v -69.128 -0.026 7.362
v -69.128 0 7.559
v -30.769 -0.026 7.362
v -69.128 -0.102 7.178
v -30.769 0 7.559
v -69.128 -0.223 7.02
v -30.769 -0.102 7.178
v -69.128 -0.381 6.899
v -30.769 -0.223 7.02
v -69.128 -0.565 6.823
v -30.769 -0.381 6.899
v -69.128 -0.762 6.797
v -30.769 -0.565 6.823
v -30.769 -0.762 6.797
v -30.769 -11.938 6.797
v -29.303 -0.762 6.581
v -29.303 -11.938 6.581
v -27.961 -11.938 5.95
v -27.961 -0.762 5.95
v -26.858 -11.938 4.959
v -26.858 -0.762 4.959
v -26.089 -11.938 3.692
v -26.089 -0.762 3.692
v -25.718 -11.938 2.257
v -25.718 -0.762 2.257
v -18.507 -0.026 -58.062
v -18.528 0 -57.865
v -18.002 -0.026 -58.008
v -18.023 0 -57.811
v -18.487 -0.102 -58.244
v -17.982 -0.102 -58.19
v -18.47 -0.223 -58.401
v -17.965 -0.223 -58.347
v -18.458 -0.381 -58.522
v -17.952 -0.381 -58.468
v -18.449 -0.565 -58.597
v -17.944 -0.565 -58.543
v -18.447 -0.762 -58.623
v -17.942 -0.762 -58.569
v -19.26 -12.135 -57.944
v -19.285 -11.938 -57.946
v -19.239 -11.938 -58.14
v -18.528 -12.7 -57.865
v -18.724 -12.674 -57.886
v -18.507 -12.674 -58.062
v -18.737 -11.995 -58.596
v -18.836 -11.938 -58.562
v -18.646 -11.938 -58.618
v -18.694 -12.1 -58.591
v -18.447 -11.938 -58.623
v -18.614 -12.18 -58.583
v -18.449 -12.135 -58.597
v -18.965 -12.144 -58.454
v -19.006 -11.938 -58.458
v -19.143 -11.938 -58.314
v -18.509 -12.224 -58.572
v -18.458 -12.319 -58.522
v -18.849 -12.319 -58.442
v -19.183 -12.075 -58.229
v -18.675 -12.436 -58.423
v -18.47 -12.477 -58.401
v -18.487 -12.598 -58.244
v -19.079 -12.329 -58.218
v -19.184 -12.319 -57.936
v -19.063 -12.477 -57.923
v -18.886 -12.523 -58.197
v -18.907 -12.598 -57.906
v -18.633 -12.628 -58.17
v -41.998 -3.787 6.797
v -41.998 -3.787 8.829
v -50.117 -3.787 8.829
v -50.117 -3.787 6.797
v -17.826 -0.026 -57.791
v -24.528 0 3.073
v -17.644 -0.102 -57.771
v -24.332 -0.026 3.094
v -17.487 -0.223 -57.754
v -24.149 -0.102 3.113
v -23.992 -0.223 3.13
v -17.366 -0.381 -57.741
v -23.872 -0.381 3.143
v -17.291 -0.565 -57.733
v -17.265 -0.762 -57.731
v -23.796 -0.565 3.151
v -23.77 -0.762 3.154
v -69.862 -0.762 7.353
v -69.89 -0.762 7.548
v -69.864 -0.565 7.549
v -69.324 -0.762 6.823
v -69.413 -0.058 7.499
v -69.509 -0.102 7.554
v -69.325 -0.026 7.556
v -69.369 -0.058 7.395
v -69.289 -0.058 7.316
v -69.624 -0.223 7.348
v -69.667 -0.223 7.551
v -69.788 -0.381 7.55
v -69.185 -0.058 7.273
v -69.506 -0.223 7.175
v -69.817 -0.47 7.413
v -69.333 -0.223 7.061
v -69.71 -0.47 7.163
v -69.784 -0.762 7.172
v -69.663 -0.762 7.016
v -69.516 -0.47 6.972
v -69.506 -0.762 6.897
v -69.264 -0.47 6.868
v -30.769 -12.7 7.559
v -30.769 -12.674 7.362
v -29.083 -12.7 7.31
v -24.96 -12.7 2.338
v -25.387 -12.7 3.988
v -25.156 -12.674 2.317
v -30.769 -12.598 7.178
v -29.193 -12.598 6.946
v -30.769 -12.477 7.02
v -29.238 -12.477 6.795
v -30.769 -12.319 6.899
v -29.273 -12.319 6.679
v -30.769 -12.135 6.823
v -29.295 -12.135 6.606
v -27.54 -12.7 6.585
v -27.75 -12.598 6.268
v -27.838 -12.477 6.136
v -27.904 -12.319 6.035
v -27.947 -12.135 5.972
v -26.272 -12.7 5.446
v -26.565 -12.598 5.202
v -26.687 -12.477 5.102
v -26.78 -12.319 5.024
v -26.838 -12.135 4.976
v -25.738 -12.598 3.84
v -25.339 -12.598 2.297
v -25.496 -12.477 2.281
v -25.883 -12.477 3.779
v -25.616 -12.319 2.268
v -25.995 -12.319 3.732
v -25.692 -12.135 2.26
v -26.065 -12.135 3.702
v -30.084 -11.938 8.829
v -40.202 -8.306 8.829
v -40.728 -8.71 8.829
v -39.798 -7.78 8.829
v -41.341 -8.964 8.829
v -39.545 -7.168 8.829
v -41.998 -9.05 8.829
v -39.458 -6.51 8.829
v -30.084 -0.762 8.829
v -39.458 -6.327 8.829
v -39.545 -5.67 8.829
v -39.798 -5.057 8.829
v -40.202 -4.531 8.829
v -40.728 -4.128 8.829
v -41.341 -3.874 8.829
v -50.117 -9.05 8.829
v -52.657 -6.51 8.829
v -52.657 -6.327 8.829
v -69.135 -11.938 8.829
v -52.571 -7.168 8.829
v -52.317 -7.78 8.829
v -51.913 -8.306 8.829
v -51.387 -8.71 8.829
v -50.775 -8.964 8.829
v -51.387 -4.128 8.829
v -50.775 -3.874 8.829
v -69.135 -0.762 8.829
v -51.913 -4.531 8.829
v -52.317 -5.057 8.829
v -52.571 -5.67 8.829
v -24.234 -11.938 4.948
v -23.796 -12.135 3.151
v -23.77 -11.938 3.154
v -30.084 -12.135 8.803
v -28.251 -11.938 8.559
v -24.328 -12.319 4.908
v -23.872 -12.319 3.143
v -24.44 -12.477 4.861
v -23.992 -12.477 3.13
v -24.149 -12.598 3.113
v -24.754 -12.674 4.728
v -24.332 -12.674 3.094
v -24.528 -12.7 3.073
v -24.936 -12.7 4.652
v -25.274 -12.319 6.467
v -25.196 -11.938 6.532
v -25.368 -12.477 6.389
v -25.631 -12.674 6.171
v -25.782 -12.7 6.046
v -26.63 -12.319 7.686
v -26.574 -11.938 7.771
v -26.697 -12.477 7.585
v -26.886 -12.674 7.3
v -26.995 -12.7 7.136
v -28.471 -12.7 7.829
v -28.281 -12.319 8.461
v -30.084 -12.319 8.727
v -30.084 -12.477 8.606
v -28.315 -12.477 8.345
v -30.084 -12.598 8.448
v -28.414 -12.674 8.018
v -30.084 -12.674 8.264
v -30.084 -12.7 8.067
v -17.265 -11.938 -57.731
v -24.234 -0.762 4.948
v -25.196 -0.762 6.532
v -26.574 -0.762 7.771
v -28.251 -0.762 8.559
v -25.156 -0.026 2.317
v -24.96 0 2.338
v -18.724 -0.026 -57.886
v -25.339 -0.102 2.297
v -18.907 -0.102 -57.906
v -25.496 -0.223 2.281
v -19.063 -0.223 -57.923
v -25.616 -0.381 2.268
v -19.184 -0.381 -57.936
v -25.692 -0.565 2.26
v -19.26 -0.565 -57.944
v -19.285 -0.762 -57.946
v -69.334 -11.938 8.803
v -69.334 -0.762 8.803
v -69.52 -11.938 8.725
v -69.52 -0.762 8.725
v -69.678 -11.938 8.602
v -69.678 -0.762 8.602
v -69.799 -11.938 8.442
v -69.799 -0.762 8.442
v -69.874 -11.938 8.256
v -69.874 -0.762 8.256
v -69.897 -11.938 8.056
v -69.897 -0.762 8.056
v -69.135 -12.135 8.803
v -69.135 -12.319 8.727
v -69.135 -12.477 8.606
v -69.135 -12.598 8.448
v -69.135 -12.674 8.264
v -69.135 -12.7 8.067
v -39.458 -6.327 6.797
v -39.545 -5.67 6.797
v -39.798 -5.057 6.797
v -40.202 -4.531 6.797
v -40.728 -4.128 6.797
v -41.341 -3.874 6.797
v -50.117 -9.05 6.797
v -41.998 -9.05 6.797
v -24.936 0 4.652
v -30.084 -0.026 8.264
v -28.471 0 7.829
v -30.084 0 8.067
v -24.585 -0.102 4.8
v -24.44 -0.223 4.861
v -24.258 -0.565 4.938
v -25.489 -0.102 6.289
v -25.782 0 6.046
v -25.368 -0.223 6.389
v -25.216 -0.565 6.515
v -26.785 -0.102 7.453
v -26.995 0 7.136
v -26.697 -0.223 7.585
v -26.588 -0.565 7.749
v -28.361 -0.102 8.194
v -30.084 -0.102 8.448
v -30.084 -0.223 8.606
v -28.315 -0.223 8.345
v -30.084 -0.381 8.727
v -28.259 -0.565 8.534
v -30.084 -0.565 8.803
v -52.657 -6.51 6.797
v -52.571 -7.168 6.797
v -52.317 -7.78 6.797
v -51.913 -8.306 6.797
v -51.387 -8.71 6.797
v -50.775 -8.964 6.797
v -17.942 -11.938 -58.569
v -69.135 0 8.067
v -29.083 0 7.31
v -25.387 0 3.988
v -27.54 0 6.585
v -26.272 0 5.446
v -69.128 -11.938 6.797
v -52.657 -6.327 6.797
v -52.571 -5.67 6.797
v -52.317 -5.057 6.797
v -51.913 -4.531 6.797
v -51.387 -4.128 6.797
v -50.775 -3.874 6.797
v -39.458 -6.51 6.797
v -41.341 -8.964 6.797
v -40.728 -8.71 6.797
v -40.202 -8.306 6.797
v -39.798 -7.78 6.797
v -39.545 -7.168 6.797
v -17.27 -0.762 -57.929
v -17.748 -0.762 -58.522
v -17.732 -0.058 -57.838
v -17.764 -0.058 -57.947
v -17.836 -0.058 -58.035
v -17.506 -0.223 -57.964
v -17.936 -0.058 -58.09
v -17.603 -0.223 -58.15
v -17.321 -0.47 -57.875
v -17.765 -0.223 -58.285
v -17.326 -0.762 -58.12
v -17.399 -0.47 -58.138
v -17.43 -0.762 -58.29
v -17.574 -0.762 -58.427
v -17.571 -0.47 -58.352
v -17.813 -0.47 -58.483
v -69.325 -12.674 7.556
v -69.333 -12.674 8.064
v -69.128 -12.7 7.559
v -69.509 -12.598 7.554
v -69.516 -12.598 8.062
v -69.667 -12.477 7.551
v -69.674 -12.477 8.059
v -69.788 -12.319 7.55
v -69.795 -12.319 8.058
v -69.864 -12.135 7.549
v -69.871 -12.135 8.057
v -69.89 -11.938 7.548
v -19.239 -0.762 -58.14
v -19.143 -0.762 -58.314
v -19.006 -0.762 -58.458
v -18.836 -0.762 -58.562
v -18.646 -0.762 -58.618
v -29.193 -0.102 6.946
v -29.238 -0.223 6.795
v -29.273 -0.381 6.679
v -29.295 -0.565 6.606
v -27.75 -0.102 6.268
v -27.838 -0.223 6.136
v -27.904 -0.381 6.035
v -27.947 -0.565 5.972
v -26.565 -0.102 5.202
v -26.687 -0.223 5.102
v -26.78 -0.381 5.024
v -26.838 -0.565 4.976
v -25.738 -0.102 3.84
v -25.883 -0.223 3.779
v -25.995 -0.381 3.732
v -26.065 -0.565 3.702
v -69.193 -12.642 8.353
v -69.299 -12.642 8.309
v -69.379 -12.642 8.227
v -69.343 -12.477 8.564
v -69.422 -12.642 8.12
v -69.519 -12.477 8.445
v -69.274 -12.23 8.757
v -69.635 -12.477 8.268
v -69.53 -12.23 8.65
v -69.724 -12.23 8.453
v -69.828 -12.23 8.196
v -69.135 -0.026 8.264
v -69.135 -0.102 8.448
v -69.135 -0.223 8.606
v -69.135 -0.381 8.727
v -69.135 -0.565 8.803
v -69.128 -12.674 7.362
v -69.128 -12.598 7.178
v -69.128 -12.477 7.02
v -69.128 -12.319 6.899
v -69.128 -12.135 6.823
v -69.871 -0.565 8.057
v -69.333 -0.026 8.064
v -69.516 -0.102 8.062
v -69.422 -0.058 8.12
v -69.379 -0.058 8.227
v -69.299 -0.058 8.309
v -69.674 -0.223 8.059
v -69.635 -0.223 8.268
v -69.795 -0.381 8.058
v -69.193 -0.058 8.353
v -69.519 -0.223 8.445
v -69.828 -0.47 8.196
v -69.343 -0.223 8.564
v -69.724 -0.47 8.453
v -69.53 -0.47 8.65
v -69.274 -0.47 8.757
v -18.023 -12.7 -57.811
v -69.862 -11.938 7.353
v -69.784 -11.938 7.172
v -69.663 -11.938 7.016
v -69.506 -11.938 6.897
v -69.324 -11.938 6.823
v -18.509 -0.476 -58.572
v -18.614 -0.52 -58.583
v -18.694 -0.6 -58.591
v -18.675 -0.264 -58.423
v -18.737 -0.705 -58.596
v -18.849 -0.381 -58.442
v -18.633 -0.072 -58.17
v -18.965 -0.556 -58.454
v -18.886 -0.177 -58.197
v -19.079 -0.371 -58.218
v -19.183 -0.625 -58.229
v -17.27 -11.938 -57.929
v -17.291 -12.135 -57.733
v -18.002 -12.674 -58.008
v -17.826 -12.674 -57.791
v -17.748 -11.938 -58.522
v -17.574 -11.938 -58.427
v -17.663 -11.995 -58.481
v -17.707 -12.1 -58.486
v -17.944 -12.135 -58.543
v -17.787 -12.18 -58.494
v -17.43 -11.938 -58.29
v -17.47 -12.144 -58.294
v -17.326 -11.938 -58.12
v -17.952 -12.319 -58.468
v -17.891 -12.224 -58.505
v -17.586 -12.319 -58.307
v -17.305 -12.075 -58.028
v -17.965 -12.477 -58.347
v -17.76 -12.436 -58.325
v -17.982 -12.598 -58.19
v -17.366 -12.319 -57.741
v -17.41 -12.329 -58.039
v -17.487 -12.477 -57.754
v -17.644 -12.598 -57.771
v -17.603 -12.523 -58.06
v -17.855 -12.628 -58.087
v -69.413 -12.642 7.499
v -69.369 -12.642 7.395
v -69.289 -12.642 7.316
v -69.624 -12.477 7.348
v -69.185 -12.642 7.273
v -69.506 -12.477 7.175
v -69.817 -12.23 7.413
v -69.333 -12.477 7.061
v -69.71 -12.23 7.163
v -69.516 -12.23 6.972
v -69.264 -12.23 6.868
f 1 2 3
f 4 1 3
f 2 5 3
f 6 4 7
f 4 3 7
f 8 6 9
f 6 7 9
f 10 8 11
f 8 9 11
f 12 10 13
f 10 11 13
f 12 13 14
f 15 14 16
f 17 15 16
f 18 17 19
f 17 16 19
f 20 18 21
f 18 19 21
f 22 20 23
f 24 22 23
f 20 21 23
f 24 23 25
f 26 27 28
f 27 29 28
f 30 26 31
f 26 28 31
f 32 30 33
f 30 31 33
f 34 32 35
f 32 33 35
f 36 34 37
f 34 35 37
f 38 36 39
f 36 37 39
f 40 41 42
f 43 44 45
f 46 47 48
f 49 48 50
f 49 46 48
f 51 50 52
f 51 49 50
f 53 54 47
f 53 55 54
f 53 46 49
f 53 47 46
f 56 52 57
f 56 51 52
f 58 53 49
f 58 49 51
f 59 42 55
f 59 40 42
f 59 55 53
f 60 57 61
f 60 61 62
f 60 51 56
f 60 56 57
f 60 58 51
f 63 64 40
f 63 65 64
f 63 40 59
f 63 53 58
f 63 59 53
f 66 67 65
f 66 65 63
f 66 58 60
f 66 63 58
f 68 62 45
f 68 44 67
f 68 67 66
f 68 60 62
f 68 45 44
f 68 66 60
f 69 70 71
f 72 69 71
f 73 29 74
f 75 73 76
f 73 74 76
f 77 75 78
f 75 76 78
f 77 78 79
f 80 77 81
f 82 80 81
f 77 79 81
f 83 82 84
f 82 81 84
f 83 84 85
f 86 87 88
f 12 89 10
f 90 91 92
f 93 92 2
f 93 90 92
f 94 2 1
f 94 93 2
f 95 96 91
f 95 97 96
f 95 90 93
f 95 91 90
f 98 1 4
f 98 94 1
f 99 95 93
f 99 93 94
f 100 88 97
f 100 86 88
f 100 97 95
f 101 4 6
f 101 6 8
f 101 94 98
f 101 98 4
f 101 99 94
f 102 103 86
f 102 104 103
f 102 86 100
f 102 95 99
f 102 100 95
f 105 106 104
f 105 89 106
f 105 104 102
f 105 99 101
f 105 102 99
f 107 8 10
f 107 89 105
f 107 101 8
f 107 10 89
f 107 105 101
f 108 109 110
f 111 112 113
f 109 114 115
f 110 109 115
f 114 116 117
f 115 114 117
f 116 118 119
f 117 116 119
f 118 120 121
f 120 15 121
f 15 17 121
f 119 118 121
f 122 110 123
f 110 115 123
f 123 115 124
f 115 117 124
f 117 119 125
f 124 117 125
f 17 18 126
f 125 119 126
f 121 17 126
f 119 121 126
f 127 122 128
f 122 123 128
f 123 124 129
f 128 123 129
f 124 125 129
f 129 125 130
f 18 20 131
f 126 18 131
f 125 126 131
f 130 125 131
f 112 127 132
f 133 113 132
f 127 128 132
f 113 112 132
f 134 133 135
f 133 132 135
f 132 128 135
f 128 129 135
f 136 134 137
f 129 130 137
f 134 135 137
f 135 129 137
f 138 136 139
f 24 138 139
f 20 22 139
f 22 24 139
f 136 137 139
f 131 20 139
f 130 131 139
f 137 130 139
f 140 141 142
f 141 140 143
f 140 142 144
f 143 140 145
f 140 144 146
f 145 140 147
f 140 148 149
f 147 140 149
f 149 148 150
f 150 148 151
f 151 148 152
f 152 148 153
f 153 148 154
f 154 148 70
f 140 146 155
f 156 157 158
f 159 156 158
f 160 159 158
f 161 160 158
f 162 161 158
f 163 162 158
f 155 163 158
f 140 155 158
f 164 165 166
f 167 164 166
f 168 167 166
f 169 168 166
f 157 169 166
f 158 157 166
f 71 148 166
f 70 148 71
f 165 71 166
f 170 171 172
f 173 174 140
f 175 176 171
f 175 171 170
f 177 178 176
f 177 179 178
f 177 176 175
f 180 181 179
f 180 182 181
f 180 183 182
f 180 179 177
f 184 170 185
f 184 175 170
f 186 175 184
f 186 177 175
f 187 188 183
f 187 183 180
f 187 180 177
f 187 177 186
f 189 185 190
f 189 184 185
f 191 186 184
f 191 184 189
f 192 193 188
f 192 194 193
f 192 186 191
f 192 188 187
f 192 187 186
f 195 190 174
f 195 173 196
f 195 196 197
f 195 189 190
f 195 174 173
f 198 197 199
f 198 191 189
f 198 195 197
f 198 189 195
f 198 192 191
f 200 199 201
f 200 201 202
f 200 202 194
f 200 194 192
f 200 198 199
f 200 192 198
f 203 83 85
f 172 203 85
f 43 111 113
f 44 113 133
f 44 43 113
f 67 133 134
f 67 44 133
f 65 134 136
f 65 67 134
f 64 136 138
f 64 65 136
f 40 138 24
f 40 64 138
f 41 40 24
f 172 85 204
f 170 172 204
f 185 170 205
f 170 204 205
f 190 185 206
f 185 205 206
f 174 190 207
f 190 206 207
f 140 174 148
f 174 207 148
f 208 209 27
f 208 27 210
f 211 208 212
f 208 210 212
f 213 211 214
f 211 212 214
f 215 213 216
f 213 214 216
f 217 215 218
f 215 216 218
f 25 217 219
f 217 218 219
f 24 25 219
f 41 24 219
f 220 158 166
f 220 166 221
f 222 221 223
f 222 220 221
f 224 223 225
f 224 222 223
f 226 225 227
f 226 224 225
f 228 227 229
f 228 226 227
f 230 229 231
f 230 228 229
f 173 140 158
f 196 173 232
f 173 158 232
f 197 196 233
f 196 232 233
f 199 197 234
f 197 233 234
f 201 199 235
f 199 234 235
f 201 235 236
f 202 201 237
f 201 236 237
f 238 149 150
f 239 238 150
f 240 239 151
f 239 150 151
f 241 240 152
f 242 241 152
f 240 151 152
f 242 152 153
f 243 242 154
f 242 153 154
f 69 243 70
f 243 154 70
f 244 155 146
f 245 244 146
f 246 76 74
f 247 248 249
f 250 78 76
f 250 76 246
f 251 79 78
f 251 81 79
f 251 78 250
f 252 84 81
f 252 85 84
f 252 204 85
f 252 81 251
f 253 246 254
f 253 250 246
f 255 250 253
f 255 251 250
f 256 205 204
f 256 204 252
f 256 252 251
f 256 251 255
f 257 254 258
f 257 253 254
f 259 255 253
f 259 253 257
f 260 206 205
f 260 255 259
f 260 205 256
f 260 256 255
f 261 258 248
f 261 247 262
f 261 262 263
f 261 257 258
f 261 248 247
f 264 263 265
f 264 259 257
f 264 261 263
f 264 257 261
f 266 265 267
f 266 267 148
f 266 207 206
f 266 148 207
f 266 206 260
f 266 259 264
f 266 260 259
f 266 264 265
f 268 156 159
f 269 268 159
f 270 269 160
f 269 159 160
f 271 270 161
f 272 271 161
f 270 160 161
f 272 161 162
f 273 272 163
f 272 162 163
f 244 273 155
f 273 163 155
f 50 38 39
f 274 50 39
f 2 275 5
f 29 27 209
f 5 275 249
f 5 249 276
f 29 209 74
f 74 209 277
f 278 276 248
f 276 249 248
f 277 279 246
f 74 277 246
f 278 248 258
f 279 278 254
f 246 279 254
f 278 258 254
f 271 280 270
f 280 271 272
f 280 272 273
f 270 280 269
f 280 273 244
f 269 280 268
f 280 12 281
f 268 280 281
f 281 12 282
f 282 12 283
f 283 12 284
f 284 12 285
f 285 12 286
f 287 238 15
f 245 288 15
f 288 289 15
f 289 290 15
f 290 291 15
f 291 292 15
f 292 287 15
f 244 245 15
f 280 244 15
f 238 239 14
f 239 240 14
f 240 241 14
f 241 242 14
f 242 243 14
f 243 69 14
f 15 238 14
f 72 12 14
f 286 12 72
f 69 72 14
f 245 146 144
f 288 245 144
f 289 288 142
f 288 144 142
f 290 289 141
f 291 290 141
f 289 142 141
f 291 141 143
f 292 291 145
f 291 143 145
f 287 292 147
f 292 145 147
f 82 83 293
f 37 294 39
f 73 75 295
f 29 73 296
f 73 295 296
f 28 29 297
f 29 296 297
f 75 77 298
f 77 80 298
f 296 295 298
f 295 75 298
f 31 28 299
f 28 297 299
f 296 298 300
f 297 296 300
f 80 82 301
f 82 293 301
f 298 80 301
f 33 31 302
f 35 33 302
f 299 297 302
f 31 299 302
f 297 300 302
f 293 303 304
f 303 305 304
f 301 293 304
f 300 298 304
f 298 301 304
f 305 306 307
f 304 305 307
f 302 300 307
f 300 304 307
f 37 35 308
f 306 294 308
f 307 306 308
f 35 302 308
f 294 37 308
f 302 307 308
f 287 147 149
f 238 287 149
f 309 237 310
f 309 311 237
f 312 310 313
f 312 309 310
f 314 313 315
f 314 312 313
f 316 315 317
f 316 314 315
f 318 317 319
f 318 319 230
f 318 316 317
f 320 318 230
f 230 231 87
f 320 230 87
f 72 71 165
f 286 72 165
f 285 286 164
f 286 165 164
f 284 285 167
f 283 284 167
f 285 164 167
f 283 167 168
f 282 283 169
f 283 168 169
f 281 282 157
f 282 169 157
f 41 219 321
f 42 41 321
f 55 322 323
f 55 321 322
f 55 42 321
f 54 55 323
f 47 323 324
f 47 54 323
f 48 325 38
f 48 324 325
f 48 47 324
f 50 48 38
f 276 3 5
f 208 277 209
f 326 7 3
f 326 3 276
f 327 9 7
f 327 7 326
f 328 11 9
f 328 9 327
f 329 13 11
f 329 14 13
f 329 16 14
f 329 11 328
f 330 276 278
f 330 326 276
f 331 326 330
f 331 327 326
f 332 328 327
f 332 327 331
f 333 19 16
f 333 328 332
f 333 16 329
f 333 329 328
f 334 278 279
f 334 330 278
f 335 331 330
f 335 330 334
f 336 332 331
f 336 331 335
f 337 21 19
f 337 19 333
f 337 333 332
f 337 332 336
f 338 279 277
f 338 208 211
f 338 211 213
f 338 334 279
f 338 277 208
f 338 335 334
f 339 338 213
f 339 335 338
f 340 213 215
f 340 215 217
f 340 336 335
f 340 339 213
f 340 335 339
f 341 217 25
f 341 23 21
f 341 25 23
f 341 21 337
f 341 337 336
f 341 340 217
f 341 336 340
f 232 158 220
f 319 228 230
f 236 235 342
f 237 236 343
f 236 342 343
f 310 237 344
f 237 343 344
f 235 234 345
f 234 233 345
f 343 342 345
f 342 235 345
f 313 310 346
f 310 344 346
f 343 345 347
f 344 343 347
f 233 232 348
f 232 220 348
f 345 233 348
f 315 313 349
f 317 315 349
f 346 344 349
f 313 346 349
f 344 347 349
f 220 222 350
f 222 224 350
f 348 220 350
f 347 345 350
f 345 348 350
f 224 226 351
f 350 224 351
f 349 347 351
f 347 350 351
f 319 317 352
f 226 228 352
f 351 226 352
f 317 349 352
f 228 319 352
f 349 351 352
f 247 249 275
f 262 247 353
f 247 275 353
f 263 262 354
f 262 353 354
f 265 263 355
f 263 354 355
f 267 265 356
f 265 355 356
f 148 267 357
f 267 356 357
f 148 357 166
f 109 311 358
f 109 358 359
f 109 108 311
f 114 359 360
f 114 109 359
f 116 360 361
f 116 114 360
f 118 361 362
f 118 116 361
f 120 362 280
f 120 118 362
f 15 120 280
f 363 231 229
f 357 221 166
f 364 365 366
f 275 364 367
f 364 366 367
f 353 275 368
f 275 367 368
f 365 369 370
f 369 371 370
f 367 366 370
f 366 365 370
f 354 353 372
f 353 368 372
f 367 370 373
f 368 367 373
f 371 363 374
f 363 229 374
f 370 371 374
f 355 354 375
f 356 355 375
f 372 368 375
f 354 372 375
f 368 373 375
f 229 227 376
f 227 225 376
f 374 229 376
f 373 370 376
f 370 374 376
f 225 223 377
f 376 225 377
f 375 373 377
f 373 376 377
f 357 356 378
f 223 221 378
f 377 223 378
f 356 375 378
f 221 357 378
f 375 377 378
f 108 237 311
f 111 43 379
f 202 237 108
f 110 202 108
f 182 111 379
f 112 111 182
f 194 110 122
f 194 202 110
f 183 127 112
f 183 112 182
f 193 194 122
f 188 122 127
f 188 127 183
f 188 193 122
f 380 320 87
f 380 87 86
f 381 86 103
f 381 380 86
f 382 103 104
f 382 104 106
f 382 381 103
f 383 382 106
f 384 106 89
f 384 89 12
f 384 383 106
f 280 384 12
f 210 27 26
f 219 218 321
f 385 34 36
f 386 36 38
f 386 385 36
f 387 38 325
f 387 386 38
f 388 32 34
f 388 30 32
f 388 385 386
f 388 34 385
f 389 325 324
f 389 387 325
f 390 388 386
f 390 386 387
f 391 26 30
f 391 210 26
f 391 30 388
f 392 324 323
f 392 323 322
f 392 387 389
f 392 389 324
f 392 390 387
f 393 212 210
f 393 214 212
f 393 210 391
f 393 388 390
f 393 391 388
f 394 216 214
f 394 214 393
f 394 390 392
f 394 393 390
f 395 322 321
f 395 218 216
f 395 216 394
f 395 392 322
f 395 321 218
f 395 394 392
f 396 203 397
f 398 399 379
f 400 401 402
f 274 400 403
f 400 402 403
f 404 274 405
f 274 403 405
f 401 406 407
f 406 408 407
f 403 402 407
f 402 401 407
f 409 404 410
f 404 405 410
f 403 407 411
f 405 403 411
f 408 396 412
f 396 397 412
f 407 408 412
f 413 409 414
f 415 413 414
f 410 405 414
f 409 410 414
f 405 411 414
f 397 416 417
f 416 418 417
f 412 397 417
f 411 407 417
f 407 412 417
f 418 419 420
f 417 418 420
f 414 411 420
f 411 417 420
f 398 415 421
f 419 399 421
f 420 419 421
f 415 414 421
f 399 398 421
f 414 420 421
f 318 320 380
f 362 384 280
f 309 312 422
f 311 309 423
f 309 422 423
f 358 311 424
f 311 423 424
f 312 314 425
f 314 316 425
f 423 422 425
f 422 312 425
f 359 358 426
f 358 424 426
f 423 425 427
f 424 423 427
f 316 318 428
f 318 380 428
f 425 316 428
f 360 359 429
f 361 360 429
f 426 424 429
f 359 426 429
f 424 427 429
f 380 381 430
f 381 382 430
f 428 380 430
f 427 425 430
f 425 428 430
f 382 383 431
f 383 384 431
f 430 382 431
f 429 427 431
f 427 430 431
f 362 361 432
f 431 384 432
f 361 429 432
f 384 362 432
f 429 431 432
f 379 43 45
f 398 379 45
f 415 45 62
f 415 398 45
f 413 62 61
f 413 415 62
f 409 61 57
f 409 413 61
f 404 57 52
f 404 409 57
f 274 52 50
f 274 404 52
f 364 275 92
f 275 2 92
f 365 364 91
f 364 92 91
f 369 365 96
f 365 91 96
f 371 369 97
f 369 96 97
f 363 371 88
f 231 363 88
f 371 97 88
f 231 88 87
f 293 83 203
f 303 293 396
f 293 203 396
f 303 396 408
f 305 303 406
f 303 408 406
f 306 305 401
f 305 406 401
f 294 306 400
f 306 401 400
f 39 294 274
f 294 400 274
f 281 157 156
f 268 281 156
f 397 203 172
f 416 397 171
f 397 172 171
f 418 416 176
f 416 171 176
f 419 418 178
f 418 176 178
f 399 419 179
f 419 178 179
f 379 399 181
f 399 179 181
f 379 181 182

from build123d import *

# Parameters (mm, degrees)
F1_DEPTH = 12.7
F3_DEPTH = 25.4
F4_R     = 0.762


with BuildPart() as f1:
    # F0 (on Front) → F1 (new body)
    with BuildSketch(Plane.XZ):
        with BuildLine():
            Line((-30.084311, 8.829161), (-69.908474, 8.829161))
            Line((-69.908474, 8.829161), (-69.879254, 6.797161))
            Line((-69.879254, 6.797161), (-30.769229, 6.797161))
            ThreePointArc((-30.769229, 6.797161), (-27.373303, 5.495266), (-25.717982, 2.256878))
            Line((-25.717982, 2.256878), (-19.204397, -58.704096))
            Line((-19.204397, -58.704096), (-17.183898, -58.488209))
            Line((-17.183898, -58.488209), (-23.770251, 3.153808))
            ThreePointArc((-23.770251, 3.153808), (-25.839402, 7.201793), (-30.084311, 8.829161))
        make_face()
    extrude(amount=F1_DEPTH)

    # F2 (on face) → F3 (cut)
    with BuildSketch(Plane.XY.offset(8.829161)):
        with BuildLine():
            Line((-41.998038, -3.787424), (-50.117151, -3.787424))
            ThreePointArc((-50.117151, -3.787424), (-51.913202, -4.531373), (-52.657151, -6.327424))
            Line((-52.657151, -6.327424), (-52.657151, -6.510304))
            ThreePointArc((-52.657151, -6.510304), (-51.913202, -8.306355), (-50.117151, -9.050304))
            Line((-50.117151, -9.050304), (-41.998038, -9.050304))
            ThreePointArc((-41.998038, -9.050304), (-40.201987, -8.306355), (-39.458038, -6.510304))
            Line((-39.458038, -6.510304), (-39.458038, -6.327424))
            ThreePointArc((-39.458038, -6.327424), (-40.201987, -4.531373), (-41.998038, -3.787424))
        make_face()
    extrude(amount=-F3_DEPTH, mode=Mode.SUBTRACT)

    # F4
    f4_edges = [f1.edges().sort_by_distance(p)[0] for p in [
        (-49.996392, -12.7, 8.829161),
        (-17.183898, -6.35, -58.488209),
        (-50.324242, -12.7, 6.797161),
        (-20.477074, 0, -27.6672),
        (-22.461189, 0, -28.223609),
        (-18.194148, 0, -58.596152),
        (-19.204397, -6.35, -58.704096),
        (-18.194148, -12.7, -58.596152),
        (-69.879254, -6.35, 6.797161),
        (-69.893864, -12.7, 7.813161),
        (-69.908474, -6.35, 8.829161),
        (-69.893864, 0, 7.813161),
        (-25.839402, 0, 7.201793),
        (-25.839402, -12.7, 7.201793),
    ]]
    fillet(f4_edges, radius=F4_R)


solid = f1.part
